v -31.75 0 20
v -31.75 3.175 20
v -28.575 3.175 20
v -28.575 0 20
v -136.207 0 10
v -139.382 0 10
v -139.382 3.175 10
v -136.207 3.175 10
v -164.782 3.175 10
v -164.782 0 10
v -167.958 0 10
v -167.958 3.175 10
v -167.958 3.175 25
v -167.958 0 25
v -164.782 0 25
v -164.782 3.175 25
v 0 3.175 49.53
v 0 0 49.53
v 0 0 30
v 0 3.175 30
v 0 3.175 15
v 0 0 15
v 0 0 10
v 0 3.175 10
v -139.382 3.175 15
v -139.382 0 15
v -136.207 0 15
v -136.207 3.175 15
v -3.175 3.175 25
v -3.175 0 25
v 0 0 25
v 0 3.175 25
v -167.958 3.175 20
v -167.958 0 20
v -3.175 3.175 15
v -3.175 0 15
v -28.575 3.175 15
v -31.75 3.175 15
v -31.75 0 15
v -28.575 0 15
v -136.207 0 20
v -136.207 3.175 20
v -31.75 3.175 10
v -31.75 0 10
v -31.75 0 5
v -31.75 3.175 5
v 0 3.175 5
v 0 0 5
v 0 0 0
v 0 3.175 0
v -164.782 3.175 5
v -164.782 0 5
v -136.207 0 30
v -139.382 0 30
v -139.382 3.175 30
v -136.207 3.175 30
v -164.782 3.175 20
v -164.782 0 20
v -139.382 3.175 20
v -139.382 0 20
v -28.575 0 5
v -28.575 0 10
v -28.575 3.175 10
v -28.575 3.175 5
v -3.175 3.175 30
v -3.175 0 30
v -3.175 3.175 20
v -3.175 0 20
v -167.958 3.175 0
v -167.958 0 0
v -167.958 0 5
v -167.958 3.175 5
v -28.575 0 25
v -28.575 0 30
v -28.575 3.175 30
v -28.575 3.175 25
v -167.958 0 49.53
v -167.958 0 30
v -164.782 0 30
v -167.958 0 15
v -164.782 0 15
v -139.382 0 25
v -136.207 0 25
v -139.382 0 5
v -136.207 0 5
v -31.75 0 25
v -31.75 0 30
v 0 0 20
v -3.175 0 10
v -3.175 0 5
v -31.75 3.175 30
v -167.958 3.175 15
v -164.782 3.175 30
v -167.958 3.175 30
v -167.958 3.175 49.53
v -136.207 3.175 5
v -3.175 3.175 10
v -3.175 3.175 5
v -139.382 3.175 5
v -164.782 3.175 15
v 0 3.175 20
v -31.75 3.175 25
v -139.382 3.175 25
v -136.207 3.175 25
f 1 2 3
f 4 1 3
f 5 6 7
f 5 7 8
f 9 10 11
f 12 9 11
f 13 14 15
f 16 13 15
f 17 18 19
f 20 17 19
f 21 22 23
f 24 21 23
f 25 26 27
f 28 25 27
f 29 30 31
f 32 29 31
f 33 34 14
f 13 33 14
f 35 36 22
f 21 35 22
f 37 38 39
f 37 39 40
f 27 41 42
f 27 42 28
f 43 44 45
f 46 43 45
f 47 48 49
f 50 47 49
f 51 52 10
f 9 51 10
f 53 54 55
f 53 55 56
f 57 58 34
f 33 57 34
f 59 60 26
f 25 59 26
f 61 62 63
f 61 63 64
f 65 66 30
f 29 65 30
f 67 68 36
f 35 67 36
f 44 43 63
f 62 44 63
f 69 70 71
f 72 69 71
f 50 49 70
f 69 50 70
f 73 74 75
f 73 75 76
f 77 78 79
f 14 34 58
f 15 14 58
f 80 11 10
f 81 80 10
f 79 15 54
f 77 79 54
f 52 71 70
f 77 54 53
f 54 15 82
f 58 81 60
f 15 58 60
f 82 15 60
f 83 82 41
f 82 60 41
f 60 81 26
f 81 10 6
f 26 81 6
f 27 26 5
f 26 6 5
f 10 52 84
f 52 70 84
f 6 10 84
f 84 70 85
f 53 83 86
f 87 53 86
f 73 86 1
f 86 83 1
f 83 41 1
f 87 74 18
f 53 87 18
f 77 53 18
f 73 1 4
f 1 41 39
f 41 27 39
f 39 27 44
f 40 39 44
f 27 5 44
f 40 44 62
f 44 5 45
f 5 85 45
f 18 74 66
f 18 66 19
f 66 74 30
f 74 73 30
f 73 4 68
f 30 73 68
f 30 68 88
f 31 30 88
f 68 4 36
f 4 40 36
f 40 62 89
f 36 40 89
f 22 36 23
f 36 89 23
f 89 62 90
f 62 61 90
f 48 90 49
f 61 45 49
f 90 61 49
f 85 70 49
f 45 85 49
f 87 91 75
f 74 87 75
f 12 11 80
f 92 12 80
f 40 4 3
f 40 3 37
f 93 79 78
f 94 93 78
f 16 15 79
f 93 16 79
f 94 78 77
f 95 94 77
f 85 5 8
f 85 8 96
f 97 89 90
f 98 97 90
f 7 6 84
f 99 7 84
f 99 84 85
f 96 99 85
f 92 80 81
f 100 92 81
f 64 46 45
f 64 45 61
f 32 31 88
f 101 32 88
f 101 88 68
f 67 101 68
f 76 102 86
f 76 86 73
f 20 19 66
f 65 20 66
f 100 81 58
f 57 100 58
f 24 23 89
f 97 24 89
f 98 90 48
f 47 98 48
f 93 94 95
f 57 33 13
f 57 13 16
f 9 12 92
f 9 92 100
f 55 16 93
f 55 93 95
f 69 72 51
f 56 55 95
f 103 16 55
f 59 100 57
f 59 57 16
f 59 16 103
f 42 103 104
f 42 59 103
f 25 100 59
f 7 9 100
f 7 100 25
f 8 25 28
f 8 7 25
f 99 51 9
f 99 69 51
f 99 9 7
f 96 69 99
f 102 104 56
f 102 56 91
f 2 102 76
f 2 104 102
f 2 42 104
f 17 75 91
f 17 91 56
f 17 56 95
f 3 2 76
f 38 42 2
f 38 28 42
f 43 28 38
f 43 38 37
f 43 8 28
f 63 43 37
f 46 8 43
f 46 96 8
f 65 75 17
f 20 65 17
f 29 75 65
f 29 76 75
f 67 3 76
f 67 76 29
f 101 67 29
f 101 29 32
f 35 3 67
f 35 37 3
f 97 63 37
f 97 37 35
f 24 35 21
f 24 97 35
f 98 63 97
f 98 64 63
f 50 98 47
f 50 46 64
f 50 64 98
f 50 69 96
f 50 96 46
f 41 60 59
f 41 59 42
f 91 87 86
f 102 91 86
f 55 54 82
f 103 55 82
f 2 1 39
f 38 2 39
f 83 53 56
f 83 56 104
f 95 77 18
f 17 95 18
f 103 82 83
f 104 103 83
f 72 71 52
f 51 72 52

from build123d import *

# Parameters (mm, degrees)
SKETCH1_W           = 3.175
SKETCH1_H           = 5
BOSS_EXTRUDE1_DEPTH = 3.175


with BuildPart() as part:
    # Sketch1 → Boss-Extrude1 (new body)
    with BuildSketch(Plane(origin=(0, 0, 0), x_dir=(1, 0, 0), z_dir=(0, 1, 0))):
        Polygon((-167.9575, -5), (-164.7825, -5), (-164.7825, -10), (-167.9575, -10), (-167.9575, -15), (-164.7825, -15), (-164.7825, -20), (-167.9575, -20), (-167.9575, -25), (-164.7825, -25), (-164.7825, -30), (-167.9575, -30), (-167.9575, -49.53), (-164.7825, -49.53), (-66.4845, -49.53), (0, -49.53), (0, -30), (-3.175, -30), (-3.175, -25), (0, -25), (0, -20), (-3.175, -20), (-3.175, -15), (0, -15), (0, -10), (-3.175, -10), (-3.175, -5), (0, -5), (0, 0), (-66.4845, 0), (-164.7825, 0), (-167.9575, 0), align=None)
        with Locations((-137.795, -7.5)):
            Rectangle(SKETCH1_W, SKETCH1_H, mode=Mode.SUBTRACT)
        with Locations((-137.795, -17.5)):
            Rectangle(SKETCH1_W, SKETCH1_H, mode=Mode.SUBTRACT)
        with Locations((-137.795, -27.5)):
            Rectangle(SKETCH1_W, SKETCH1_H, mode=Mode.SUBTRACT)
        with Locations((-30.1625, -27.5)):
            Rectangle(SKETCH1_W, SKETCH1_H, mode=Mode.SUBTRACT)
        with Locations((-30.1625, -17.5)):
            Rectangle(SKETCH1_W, SKETCH1_H, mode=Mode.SUBTRACT)
        with Locations((-30.1625, -7.5)):
            Rectangle(SKETCH1_W, SKETCH1_H, mode=Mode.SUBTRACT)
    extrude(amount=BOSS_EXTRUDE1_DEPTH)


solid = part.part
